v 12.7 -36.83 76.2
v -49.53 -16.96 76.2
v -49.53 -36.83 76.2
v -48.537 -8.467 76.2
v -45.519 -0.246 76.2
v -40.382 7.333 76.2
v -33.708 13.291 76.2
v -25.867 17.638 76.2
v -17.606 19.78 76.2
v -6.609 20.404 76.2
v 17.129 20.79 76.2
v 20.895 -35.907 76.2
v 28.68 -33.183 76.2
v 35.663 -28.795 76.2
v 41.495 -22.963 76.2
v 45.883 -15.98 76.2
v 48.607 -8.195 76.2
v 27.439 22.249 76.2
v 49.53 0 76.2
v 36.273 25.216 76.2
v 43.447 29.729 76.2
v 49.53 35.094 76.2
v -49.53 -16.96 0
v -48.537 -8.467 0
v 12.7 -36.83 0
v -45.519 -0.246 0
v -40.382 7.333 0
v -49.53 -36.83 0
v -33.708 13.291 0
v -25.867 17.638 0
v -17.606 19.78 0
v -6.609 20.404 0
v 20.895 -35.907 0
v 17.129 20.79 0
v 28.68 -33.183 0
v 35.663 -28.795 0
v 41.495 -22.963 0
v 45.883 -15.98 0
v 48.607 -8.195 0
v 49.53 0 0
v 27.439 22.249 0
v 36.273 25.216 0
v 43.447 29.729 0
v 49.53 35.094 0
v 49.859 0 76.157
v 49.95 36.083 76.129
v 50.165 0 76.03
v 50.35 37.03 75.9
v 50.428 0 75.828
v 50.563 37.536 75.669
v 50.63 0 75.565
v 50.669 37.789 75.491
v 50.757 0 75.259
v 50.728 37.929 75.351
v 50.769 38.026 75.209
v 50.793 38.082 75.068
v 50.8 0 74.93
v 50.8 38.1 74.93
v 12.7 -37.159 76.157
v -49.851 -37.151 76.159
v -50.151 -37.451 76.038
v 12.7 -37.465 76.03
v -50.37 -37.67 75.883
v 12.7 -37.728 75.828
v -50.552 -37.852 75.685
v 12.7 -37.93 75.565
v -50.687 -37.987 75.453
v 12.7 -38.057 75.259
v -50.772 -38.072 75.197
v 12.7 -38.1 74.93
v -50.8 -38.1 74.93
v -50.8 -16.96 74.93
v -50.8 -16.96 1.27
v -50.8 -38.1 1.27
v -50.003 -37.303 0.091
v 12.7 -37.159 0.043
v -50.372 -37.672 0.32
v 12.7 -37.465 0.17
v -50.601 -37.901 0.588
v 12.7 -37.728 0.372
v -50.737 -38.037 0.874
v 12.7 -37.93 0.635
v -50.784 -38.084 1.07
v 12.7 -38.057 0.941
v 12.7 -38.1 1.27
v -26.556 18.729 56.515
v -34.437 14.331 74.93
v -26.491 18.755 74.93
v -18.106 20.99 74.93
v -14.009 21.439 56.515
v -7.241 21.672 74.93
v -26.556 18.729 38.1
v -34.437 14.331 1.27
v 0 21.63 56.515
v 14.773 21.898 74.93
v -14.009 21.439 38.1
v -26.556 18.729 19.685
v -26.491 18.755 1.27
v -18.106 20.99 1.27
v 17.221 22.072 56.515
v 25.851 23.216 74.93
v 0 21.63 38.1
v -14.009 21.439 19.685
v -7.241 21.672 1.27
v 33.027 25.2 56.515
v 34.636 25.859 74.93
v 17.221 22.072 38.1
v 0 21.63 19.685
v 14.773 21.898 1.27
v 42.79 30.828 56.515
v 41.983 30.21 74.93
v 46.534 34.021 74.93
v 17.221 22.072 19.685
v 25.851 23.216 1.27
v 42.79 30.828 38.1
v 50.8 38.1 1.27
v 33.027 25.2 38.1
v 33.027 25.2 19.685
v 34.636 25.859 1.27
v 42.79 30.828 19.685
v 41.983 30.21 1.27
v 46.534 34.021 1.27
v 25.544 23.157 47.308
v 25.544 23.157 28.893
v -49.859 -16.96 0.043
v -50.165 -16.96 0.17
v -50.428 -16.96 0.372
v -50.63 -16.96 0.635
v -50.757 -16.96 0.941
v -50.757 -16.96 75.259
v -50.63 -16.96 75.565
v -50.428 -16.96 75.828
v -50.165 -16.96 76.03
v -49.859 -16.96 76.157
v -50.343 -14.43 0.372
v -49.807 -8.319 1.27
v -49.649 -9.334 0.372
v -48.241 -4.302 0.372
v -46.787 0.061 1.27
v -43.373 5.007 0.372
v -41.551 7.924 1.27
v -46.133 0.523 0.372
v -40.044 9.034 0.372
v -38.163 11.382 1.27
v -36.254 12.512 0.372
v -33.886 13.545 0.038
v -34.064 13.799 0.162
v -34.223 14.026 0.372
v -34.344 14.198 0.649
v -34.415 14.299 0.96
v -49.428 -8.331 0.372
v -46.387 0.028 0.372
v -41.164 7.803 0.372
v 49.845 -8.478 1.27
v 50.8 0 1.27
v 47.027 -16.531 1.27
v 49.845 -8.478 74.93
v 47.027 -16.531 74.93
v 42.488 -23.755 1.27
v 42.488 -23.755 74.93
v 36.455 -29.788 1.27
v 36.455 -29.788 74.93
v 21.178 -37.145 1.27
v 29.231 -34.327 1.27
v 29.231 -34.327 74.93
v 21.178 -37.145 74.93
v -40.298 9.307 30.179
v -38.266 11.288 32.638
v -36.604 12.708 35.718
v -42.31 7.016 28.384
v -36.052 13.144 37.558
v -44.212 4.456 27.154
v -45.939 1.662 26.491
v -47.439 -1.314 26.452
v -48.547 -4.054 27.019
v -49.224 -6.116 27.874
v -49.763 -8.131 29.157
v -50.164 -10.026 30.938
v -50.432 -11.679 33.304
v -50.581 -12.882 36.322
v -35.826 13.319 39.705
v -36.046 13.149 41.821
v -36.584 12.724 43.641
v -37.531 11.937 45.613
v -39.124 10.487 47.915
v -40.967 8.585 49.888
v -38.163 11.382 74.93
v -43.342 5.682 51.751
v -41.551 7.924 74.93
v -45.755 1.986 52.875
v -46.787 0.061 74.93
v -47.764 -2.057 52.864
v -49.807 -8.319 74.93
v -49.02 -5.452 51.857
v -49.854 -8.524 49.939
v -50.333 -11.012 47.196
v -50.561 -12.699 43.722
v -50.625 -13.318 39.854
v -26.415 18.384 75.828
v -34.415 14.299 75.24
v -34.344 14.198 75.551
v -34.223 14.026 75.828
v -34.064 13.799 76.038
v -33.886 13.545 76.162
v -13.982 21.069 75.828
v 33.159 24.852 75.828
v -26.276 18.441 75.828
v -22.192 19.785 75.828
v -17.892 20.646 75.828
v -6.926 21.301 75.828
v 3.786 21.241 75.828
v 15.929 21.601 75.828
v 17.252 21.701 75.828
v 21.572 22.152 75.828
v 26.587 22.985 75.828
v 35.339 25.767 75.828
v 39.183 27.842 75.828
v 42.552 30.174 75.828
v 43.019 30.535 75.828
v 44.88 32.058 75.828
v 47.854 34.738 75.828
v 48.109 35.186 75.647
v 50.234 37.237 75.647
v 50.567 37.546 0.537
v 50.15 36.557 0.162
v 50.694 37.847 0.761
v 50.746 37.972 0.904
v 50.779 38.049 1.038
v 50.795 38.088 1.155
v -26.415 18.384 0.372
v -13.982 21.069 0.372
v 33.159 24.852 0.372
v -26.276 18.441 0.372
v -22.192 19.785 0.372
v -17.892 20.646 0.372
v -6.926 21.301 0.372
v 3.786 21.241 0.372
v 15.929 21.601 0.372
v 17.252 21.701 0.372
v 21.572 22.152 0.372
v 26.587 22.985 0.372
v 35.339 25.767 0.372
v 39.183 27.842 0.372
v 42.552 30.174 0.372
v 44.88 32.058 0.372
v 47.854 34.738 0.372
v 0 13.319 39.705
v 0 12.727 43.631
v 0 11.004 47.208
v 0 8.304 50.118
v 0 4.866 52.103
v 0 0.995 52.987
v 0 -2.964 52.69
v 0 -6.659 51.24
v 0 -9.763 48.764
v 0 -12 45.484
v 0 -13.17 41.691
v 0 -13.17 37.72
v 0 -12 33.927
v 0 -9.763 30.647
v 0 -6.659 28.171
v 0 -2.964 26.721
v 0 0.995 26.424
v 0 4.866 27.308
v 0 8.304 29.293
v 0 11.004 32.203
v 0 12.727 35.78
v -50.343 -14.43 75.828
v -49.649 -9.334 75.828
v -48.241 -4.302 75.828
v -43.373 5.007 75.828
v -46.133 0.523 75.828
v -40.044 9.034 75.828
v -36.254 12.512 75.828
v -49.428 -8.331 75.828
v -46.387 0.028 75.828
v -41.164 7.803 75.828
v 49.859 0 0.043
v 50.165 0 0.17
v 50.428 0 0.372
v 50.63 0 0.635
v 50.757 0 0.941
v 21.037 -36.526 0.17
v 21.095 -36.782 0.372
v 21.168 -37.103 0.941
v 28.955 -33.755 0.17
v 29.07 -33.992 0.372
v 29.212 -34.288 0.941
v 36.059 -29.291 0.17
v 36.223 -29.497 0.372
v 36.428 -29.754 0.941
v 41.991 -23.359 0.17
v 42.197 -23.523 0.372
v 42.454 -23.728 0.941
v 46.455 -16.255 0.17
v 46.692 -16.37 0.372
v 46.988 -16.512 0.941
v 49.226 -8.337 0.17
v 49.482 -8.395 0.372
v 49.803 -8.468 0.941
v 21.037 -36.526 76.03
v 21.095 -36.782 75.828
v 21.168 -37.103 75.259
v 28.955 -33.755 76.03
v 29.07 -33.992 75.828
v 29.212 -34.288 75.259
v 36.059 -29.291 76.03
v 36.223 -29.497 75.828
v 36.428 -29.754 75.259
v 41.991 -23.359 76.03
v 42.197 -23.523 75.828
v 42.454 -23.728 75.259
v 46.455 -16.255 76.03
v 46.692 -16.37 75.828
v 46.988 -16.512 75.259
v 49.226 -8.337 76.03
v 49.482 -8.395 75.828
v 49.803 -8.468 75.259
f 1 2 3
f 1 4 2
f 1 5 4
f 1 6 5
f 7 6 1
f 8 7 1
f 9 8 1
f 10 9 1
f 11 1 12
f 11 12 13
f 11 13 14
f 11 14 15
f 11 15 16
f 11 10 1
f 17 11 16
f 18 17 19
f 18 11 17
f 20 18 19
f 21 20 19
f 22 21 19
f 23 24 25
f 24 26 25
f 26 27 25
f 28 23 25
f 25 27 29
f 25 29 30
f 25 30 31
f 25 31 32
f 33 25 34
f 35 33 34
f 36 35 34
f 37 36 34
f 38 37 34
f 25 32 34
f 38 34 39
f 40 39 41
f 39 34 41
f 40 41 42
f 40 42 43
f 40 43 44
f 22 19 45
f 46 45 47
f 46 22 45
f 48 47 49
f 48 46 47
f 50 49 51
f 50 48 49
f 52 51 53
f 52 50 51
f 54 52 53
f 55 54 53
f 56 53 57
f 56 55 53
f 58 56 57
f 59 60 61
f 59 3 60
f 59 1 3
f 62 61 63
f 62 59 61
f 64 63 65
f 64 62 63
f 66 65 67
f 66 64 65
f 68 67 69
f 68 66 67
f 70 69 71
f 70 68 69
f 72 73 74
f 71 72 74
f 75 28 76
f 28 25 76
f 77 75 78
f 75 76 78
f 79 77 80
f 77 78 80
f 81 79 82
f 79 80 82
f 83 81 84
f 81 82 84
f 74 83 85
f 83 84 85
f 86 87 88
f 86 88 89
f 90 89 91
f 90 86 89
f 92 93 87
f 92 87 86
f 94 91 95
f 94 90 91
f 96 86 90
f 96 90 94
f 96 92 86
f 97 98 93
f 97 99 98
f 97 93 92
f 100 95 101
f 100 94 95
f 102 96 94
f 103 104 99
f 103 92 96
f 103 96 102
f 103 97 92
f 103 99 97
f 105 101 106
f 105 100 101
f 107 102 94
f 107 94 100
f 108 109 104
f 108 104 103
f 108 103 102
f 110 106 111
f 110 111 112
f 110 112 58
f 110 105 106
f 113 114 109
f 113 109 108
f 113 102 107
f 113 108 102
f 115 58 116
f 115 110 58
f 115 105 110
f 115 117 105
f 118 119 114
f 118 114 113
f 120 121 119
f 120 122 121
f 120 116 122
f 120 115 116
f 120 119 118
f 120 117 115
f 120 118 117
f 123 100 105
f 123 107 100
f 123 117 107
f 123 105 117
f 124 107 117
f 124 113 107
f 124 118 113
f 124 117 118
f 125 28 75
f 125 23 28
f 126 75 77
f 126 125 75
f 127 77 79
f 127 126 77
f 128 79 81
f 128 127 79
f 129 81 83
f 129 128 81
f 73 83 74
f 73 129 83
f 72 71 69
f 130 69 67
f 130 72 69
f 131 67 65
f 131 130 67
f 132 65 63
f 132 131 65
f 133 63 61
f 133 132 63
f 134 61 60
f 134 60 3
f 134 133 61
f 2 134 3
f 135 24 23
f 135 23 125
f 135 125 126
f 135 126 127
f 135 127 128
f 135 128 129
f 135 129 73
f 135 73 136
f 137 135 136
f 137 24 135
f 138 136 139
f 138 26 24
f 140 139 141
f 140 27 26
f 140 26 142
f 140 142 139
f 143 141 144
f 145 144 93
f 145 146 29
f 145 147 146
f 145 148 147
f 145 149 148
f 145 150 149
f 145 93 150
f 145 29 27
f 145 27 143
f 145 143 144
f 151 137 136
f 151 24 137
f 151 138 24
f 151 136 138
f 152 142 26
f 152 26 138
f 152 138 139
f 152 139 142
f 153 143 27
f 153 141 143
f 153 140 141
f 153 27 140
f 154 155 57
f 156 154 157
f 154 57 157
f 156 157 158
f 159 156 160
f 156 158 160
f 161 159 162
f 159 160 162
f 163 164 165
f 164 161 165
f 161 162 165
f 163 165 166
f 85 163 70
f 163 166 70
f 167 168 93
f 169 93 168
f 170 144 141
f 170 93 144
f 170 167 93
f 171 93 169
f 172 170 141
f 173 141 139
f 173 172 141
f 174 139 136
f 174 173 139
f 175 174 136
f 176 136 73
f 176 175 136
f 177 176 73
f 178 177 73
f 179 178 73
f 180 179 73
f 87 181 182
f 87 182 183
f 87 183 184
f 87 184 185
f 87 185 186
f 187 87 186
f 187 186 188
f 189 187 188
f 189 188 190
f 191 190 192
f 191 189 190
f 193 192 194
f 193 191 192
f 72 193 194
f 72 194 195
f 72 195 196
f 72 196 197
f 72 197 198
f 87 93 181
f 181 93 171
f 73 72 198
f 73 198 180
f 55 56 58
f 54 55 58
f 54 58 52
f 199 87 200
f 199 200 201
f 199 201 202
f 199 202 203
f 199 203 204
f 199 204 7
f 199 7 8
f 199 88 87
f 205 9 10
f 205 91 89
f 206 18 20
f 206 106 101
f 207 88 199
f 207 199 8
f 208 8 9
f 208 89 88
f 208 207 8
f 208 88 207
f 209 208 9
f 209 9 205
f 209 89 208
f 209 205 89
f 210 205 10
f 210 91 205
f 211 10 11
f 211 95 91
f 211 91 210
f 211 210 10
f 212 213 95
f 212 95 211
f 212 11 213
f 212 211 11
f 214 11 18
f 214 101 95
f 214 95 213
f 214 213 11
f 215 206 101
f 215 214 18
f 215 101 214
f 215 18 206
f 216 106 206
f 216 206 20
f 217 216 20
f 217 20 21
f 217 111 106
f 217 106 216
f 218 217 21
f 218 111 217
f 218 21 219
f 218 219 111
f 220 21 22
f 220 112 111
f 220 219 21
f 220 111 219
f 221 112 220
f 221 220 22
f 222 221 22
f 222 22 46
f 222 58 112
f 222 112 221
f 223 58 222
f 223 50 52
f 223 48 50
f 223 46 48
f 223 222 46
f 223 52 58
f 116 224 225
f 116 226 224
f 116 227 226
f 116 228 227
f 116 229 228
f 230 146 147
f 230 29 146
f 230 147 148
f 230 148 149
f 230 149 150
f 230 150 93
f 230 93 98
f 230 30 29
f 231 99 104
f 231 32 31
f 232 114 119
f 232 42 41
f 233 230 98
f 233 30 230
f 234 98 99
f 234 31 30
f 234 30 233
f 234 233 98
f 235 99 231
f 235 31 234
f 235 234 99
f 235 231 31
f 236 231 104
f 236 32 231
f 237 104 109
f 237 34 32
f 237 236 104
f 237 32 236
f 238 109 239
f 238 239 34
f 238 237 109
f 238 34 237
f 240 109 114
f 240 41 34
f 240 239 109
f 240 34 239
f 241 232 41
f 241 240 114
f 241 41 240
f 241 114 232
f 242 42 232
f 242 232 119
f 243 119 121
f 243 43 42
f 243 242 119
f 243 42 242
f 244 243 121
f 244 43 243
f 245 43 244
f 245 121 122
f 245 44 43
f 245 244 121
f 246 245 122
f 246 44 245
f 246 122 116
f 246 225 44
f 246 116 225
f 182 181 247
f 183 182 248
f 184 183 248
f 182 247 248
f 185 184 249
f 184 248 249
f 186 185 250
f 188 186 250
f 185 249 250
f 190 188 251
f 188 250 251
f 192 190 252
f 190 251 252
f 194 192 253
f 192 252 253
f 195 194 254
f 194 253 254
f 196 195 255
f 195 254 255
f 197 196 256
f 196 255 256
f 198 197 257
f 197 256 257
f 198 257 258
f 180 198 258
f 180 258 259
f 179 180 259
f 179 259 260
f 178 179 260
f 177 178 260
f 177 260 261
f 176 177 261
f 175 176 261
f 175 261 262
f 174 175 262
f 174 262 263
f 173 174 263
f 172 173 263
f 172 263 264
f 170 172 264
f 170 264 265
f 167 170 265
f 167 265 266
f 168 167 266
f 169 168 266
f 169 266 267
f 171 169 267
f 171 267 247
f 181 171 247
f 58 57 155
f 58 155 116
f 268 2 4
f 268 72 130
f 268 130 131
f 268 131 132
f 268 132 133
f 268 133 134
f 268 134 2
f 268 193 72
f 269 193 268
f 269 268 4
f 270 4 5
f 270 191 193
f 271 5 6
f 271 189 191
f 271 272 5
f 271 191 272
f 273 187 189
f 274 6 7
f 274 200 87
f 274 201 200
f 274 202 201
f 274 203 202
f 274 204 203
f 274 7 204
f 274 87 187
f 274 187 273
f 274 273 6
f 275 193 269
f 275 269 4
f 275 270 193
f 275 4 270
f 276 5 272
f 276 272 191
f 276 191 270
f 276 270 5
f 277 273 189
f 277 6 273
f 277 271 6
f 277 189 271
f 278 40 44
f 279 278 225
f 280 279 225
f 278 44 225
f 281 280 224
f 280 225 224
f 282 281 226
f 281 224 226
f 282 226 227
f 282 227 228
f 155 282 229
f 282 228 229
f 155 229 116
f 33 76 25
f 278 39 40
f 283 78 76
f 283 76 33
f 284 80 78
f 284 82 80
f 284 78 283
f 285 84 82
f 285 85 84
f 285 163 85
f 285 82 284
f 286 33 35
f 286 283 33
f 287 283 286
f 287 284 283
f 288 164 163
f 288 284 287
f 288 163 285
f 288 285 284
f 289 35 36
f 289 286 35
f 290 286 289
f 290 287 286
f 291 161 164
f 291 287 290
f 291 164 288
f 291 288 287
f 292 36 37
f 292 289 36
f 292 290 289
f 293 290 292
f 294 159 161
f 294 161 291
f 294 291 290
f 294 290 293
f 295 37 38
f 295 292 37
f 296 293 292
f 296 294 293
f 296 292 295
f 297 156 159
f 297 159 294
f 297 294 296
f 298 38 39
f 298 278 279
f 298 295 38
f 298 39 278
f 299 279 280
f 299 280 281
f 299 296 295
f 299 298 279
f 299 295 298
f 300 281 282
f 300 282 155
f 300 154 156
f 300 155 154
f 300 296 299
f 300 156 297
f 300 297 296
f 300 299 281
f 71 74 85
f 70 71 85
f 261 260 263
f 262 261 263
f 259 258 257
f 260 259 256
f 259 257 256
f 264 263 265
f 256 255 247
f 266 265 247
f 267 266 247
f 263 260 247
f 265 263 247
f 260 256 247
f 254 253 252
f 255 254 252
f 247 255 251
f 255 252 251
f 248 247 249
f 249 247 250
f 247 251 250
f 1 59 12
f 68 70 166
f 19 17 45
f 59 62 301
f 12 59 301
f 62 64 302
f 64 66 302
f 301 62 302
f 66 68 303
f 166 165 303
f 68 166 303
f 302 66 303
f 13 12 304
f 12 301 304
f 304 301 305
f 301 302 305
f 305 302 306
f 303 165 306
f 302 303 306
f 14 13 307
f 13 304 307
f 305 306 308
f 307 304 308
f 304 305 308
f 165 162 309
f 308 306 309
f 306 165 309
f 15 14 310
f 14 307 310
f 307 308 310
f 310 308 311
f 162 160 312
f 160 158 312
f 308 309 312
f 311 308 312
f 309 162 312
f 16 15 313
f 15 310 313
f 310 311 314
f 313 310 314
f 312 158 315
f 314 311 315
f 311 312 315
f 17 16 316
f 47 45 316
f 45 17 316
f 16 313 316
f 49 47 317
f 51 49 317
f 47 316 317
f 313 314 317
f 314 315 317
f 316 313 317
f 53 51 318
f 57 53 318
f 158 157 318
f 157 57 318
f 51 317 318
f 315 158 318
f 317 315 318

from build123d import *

# Parameters (mm, degrees)
F1_DEPTH = 76.2
F2_R     = 38.1
F3_R     = 1.27
F4_R     = 13.3186295464
F5_DEPTH = 50.8010001


with BuildPart() as f1:
    # F0 (on Top) → F1 (new body)
    with BuildSketch(Plane.XY):
        with BuildLine():
            Line((50.8, -38.1), (50.8, 38.1))
            add(Edge.make_bspline(
                [(-50.8, 0), (-42.9578186496, 7.6088566123), (-27.7925786216, 22.3228909539), (-0.3325914479, 21.3832091321), (34.1809209144, 21.8501210604), (45.6546344586, 33.0689548857), (50.8, 38.1)],
                knots=[0, 0, 0, 0, 0.2616576069, 0.5059943202, 0.7784647329, 1, 1, 1, 1], degree=3))
            Line((-50.8, 0), (-50.8, -38.1))
            Line((-50.8, -38.1), (50.8, -38.1))
        make_face()
    extrude(amount=F1_DEPTH)

    # F2
    f2_edges = [f1.edges().sort_by_distance(p)[0] for p in [
        (50.8, -38.1, 38.1),
        (-50.8, 0, 38.1),
    ]]
    fillet(f2_edges, radius=F2_R)

    # F3
    f3_edges = [f1.edges().sort_by_distance(p)[0] for p in [
        (9.791993, 21.686914, 76.2),
        (-19.05, -38.1, 76.2),
        (39.640768, -26.940768, 76.2),
        (-19.05, -38.1, 0),
        (9.791993, 21.686914, 0),
    ]]
    fillet(f3_edges, radius=F3_R)

    # F4 (on Right) → F5 (cut, through all)
    with BuildSketch(Plane.YZ):
        with Locations((0, 39.7054702044)):
            Circle(F4_R)
    extrude(amount=-F5_DEPTH, mode=Mode.SUBTRACT)


solid = f1.part
